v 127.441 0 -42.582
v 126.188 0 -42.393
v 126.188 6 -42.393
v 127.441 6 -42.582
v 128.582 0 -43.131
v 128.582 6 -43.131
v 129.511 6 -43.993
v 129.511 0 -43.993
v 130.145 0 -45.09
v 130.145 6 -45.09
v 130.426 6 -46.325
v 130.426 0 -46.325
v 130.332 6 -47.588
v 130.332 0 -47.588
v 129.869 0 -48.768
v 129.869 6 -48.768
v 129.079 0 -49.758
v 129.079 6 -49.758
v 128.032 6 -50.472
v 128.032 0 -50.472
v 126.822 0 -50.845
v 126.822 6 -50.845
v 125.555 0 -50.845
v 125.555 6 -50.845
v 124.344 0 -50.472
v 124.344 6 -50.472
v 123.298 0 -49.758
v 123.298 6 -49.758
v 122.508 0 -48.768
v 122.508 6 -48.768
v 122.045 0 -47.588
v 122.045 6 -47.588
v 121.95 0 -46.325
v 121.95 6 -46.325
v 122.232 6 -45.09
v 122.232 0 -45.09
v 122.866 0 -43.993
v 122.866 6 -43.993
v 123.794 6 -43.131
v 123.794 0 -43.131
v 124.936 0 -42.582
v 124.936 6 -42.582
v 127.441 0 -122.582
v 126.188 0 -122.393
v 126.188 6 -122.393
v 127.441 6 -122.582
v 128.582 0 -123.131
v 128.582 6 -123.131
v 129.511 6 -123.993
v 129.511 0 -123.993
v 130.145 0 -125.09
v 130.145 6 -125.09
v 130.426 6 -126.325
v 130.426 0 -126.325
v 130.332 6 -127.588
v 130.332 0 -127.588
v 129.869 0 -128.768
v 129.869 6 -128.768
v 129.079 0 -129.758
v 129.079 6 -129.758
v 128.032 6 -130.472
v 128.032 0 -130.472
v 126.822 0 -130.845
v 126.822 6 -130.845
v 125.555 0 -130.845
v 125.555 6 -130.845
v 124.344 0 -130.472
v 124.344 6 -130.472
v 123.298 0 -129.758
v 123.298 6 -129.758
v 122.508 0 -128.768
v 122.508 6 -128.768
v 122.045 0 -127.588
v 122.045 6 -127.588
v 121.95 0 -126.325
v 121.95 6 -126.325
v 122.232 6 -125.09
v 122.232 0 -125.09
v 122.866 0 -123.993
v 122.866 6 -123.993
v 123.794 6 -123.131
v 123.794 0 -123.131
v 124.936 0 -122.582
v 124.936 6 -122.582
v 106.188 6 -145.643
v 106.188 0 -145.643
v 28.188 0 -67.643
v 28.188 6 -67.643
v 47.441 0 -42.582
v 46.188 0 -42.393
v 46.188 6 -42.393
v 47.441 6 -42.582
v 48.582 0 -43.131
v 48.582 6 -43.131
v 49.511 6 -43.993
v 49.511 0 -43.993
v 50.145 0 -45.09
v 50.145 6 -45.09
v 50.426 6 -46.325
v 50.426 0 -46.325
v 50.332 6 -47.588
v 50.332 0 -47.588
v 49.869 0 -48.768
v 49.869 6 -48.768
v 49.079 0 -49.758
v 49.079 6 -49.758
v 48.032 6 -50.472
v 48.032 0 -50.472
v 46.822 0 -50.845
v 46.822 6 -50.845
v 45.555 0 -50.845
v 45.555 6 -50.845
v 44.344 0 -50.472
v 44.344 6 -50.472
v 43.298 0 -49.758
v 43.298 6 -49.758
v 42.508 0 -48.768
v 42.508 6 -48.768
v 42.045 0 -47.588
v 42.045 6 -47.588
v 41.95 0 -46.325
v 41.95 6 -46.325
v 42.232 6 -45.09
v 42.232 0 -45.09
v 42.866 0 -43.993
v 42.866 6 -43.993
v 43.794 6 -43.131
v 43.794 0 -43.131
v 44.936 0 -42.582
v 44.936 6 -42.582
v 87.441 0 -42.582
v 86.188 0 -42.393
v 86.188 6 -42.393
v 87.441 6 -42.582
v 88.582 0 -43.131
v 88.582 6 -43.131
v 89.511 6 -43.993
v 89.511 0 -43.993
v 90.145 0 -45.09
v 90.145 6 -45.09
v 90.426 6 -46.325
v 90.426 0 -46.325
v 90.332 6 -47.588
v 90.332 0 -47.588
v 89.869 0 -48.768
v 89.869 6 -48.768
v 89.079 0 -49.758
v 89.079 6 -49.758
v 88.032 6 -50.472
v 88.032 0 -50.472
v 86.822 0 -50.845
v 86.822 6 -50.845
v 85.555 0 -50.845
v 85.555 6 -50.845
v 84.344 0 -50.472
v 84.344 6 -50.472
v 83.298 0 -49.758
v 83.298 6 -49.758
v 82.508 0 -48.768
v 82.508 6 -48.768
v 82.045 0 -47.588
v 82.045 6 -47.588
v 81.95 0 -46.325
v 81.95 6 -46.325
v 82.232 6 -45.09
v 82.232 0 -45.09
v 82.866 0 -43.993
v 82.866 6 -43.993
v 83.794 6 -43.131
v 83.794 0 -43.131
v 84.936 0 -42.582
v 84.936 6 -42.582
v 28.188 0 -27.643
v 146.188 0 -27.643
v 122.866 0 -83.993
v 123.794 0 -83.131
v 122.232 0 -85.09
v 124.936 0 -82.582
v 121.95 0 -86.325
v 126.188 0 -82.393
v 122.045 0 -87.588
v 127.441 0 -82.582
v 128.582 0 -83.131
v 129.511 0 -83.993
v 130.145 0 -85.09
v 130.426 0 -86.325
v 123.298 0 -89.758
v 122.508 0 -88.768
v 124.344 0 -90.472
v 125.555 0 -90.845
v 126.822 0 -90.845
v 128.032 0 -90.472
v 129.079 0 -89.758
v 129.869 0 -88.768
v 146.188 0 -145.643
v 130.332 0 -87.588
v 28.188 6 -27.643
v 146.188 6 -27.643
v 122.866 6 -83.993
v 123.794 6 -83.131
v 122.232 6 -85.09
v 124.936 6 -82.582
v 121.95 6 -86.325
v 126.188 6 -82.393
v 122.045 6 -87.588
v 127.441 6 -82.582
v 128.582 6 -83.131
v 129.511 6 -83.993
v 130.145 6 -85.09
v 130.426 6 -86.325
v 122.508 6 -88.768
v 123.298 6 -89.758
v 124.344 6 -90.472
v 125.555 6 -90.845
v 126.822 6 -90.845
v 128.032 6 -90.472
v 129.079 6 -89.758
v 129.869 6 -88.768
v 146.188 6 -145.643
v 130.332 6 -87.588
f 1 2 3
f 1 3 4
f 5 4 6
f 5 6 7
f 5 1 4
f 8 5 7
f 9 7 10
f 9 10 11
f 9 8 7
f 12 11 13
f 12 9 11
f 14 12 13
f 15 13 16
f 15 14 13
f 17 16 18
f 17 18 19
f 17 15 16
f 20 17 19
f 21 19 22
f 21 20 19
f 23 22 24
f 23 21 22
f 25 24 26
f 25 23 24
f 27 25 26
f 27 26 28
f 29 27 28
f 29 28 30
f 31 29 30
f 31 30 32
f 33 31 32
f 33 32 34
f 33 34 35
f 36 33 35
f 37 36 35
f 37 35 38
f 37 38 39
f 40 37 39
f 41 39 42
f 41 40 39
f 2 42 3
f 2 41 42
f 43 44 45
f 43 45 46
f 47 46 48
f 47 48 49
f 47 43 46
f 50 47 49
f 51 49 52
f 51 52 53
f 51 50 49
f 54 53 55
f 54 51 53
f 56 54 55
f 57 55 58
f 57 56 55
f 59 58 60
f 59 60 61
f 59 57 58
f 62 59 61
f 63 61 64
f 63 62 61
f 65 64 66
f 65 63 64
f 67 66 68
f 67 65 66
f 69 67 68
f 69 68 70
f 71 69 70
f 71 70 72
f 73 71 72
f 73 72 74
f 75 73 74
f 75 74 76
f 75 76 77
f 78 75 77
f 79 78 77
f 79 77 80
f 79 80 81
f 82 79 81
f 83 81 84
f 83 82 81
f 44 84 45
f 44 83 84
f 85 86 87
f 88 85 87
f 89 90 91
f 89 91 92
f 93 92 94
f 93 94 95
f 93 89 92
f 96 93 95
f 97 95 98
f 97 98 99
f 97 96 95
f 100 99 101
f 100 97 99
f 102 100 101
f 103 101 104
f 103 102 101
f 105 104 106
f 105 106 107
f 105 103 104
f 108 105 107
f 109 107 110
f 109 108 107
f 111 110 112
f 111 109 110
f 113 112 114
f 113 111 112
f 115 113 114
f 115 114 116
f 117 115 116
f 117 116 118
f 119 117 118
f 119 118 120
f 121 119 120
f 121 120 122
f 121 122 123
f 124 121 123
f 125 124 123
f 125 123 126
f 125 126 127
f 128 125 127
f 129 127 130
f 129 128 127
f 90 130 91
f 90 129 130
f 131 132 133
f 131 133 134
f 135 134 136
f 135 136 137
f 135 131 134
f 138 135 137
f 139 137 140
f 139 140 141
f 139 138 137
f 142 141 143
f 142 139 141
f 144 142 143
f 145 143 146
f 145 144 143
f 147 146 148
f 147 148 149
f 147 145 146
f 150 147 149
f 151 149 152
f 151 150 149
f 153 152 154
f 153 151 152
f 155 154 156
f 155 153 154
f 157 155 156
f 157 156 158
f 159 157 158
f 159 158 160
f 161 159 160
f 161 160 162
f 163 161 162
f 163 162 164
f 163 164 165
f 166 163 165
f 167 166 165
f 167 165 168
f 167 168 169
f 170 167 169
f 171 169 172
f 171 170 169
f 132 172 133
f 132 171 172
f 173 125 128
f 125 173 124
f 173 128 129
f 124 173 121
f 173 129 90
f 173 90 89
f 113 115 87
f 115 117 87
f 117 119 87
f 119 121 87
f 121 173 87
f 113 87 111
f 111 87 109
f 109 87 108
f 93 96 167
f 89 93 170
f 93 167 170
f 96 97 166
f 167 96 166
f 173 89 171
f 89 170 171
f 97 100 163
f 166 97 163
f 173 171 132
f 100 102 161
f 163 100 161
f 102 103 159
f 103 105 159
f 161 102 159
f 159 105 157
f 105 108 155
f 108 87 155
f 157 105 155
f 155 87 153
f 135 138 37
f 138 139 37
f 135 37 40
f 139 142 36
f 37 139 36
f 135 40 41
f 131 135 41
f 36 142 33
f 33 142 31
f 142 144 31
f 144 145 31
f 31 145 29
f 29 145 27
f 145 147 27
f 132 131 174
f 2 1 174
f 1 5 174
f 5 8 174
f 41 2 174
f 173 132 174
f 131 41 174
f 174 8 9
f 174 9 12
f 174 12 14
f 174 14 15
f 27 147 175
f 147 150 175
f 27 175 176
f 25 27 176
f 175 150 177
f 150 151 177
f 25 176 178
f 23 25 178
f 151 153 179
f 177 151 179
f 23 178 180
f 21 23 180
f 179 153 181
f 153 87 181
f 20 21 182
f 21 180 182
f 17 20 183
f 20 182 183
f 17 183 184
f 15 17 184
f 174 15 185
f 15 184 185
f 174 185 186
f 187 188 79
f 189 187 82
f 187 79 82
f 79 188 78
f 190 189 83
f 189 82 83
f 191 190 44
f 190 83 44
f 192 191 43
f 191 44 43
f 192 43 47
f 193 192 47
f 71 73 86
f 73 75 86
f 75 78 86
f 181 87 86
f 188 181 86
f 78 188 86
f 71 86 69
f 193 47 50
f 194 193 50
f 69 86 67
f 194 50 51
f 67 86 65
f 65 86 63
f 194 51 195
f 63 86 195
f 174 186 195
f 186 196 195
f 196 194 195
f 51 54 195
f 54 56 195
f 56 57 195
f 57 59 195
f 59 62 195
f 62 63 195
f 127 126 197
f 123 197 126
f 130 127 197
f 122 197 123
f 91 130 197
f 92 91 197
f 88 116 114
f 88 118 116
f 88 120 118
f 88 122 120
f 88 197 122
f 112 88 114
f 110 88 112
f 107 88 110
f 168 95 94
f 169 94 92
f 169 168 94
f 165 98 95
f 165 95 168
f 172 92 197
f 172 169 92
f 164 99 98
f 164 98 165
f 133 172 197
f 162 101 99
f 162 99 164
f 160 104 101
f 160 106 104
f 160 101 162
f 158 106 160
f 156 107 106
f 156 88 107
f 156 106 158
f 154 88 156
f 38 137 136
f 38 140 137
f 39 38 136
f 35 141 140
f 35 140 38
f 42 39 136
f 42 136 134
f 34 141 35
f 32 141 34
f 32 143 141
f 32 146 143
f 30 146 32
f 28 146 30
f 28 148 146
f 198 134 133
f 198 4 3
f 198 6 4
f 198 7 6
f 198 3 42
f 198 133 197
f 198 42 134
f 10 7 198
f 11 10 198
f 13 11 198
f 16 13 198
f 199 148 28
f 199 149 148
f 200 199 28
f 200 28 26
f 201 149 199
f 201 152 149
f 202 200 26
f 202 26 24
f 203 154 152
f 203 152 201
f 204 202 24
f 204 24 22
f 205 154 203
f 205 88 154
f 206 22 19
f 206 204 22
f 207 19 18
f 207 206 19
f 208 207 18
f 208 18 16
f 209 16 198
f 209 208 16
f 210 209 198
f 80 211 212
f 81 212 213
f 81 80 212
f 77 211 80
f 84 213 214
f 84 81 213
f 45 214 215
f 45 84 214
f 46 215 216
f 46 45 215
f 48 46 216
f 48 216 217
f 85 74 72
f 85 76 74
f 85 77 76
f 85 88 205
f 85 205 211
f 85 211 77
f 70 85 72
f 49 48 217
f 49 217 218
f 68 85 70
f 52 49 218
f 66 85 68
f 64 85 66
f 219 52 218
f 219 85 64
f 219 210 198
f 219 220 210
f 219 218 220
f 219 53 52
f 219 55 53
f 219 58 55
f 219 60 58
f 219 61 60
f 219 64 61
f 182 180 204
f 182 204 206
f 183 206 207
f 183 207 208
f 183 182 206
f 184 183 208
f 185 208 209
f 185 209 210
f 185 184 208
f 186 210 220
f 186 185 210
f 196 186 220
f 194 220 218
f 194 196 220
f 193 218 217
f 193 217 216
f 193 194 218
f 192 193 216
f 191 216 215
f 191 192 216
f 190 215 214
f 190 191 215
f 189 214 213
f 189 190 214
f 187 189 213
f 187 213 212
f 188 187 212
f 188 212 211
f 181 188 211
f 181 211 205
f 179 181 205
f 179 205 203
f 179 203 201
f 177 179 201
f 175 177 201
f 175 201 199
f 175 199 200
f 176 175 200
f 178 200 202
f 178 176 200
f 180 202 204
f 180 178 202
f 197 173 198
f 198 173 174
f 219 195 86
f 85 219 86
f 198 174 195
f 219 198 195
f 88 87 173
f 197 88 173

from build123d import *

# Parameters (mm, degrees)
SKETCH_1_R      = 4.25
EXTRUDE_1_DEPTH = 6


with BuildPart() as part:
    # 草图1 → 凸台-拉伸1 (new body)
    with BuildSketch(Plane(origin=(0, 0, 0), x_dir=(1, 0, 0), z_dir=(0, 1, 0))):
        Polygon((28.188290634, 27.642710816), (146.188290634, 27.642710816), (146.188290634, 145.642710816), (106.188290634, 145.642710816), (28.188290634, 67.642710816), align=None)
        with Locations(Location((126.188290634, 126.642710816, 0), (0, 0, 270))):
            Circle(SKETCH_1_R, mode=Mode.SUBTRACT)
        with Locations(Location((126.188290634, 86.642710816, 0), (0, 0, 270))):
            Circle(SKETCH_1_R, mode=Mode.SUBTRACT)
        with Locations(Location((126.188290634, 46.642710816, 0), (0, 0, 270))):
            Circle(SKETCH_1_R, mode=Mode.SUBTRACT)
        with Locations(Location((86.188290634, 46.642710816, 0), (0, 0, 270))):
            Circle(SKETCH_1_R, mode=Mode.SUBTRACT)
        with Locations(Location((46.188290634, 46.642710816, 0), (0, 0, 270))):
            Circle(SKETCH_1_R, mode=Mode.SUBTRACT)
    extrude(amount=EXTRUDE_1_DEPTH)


solid = part.part
